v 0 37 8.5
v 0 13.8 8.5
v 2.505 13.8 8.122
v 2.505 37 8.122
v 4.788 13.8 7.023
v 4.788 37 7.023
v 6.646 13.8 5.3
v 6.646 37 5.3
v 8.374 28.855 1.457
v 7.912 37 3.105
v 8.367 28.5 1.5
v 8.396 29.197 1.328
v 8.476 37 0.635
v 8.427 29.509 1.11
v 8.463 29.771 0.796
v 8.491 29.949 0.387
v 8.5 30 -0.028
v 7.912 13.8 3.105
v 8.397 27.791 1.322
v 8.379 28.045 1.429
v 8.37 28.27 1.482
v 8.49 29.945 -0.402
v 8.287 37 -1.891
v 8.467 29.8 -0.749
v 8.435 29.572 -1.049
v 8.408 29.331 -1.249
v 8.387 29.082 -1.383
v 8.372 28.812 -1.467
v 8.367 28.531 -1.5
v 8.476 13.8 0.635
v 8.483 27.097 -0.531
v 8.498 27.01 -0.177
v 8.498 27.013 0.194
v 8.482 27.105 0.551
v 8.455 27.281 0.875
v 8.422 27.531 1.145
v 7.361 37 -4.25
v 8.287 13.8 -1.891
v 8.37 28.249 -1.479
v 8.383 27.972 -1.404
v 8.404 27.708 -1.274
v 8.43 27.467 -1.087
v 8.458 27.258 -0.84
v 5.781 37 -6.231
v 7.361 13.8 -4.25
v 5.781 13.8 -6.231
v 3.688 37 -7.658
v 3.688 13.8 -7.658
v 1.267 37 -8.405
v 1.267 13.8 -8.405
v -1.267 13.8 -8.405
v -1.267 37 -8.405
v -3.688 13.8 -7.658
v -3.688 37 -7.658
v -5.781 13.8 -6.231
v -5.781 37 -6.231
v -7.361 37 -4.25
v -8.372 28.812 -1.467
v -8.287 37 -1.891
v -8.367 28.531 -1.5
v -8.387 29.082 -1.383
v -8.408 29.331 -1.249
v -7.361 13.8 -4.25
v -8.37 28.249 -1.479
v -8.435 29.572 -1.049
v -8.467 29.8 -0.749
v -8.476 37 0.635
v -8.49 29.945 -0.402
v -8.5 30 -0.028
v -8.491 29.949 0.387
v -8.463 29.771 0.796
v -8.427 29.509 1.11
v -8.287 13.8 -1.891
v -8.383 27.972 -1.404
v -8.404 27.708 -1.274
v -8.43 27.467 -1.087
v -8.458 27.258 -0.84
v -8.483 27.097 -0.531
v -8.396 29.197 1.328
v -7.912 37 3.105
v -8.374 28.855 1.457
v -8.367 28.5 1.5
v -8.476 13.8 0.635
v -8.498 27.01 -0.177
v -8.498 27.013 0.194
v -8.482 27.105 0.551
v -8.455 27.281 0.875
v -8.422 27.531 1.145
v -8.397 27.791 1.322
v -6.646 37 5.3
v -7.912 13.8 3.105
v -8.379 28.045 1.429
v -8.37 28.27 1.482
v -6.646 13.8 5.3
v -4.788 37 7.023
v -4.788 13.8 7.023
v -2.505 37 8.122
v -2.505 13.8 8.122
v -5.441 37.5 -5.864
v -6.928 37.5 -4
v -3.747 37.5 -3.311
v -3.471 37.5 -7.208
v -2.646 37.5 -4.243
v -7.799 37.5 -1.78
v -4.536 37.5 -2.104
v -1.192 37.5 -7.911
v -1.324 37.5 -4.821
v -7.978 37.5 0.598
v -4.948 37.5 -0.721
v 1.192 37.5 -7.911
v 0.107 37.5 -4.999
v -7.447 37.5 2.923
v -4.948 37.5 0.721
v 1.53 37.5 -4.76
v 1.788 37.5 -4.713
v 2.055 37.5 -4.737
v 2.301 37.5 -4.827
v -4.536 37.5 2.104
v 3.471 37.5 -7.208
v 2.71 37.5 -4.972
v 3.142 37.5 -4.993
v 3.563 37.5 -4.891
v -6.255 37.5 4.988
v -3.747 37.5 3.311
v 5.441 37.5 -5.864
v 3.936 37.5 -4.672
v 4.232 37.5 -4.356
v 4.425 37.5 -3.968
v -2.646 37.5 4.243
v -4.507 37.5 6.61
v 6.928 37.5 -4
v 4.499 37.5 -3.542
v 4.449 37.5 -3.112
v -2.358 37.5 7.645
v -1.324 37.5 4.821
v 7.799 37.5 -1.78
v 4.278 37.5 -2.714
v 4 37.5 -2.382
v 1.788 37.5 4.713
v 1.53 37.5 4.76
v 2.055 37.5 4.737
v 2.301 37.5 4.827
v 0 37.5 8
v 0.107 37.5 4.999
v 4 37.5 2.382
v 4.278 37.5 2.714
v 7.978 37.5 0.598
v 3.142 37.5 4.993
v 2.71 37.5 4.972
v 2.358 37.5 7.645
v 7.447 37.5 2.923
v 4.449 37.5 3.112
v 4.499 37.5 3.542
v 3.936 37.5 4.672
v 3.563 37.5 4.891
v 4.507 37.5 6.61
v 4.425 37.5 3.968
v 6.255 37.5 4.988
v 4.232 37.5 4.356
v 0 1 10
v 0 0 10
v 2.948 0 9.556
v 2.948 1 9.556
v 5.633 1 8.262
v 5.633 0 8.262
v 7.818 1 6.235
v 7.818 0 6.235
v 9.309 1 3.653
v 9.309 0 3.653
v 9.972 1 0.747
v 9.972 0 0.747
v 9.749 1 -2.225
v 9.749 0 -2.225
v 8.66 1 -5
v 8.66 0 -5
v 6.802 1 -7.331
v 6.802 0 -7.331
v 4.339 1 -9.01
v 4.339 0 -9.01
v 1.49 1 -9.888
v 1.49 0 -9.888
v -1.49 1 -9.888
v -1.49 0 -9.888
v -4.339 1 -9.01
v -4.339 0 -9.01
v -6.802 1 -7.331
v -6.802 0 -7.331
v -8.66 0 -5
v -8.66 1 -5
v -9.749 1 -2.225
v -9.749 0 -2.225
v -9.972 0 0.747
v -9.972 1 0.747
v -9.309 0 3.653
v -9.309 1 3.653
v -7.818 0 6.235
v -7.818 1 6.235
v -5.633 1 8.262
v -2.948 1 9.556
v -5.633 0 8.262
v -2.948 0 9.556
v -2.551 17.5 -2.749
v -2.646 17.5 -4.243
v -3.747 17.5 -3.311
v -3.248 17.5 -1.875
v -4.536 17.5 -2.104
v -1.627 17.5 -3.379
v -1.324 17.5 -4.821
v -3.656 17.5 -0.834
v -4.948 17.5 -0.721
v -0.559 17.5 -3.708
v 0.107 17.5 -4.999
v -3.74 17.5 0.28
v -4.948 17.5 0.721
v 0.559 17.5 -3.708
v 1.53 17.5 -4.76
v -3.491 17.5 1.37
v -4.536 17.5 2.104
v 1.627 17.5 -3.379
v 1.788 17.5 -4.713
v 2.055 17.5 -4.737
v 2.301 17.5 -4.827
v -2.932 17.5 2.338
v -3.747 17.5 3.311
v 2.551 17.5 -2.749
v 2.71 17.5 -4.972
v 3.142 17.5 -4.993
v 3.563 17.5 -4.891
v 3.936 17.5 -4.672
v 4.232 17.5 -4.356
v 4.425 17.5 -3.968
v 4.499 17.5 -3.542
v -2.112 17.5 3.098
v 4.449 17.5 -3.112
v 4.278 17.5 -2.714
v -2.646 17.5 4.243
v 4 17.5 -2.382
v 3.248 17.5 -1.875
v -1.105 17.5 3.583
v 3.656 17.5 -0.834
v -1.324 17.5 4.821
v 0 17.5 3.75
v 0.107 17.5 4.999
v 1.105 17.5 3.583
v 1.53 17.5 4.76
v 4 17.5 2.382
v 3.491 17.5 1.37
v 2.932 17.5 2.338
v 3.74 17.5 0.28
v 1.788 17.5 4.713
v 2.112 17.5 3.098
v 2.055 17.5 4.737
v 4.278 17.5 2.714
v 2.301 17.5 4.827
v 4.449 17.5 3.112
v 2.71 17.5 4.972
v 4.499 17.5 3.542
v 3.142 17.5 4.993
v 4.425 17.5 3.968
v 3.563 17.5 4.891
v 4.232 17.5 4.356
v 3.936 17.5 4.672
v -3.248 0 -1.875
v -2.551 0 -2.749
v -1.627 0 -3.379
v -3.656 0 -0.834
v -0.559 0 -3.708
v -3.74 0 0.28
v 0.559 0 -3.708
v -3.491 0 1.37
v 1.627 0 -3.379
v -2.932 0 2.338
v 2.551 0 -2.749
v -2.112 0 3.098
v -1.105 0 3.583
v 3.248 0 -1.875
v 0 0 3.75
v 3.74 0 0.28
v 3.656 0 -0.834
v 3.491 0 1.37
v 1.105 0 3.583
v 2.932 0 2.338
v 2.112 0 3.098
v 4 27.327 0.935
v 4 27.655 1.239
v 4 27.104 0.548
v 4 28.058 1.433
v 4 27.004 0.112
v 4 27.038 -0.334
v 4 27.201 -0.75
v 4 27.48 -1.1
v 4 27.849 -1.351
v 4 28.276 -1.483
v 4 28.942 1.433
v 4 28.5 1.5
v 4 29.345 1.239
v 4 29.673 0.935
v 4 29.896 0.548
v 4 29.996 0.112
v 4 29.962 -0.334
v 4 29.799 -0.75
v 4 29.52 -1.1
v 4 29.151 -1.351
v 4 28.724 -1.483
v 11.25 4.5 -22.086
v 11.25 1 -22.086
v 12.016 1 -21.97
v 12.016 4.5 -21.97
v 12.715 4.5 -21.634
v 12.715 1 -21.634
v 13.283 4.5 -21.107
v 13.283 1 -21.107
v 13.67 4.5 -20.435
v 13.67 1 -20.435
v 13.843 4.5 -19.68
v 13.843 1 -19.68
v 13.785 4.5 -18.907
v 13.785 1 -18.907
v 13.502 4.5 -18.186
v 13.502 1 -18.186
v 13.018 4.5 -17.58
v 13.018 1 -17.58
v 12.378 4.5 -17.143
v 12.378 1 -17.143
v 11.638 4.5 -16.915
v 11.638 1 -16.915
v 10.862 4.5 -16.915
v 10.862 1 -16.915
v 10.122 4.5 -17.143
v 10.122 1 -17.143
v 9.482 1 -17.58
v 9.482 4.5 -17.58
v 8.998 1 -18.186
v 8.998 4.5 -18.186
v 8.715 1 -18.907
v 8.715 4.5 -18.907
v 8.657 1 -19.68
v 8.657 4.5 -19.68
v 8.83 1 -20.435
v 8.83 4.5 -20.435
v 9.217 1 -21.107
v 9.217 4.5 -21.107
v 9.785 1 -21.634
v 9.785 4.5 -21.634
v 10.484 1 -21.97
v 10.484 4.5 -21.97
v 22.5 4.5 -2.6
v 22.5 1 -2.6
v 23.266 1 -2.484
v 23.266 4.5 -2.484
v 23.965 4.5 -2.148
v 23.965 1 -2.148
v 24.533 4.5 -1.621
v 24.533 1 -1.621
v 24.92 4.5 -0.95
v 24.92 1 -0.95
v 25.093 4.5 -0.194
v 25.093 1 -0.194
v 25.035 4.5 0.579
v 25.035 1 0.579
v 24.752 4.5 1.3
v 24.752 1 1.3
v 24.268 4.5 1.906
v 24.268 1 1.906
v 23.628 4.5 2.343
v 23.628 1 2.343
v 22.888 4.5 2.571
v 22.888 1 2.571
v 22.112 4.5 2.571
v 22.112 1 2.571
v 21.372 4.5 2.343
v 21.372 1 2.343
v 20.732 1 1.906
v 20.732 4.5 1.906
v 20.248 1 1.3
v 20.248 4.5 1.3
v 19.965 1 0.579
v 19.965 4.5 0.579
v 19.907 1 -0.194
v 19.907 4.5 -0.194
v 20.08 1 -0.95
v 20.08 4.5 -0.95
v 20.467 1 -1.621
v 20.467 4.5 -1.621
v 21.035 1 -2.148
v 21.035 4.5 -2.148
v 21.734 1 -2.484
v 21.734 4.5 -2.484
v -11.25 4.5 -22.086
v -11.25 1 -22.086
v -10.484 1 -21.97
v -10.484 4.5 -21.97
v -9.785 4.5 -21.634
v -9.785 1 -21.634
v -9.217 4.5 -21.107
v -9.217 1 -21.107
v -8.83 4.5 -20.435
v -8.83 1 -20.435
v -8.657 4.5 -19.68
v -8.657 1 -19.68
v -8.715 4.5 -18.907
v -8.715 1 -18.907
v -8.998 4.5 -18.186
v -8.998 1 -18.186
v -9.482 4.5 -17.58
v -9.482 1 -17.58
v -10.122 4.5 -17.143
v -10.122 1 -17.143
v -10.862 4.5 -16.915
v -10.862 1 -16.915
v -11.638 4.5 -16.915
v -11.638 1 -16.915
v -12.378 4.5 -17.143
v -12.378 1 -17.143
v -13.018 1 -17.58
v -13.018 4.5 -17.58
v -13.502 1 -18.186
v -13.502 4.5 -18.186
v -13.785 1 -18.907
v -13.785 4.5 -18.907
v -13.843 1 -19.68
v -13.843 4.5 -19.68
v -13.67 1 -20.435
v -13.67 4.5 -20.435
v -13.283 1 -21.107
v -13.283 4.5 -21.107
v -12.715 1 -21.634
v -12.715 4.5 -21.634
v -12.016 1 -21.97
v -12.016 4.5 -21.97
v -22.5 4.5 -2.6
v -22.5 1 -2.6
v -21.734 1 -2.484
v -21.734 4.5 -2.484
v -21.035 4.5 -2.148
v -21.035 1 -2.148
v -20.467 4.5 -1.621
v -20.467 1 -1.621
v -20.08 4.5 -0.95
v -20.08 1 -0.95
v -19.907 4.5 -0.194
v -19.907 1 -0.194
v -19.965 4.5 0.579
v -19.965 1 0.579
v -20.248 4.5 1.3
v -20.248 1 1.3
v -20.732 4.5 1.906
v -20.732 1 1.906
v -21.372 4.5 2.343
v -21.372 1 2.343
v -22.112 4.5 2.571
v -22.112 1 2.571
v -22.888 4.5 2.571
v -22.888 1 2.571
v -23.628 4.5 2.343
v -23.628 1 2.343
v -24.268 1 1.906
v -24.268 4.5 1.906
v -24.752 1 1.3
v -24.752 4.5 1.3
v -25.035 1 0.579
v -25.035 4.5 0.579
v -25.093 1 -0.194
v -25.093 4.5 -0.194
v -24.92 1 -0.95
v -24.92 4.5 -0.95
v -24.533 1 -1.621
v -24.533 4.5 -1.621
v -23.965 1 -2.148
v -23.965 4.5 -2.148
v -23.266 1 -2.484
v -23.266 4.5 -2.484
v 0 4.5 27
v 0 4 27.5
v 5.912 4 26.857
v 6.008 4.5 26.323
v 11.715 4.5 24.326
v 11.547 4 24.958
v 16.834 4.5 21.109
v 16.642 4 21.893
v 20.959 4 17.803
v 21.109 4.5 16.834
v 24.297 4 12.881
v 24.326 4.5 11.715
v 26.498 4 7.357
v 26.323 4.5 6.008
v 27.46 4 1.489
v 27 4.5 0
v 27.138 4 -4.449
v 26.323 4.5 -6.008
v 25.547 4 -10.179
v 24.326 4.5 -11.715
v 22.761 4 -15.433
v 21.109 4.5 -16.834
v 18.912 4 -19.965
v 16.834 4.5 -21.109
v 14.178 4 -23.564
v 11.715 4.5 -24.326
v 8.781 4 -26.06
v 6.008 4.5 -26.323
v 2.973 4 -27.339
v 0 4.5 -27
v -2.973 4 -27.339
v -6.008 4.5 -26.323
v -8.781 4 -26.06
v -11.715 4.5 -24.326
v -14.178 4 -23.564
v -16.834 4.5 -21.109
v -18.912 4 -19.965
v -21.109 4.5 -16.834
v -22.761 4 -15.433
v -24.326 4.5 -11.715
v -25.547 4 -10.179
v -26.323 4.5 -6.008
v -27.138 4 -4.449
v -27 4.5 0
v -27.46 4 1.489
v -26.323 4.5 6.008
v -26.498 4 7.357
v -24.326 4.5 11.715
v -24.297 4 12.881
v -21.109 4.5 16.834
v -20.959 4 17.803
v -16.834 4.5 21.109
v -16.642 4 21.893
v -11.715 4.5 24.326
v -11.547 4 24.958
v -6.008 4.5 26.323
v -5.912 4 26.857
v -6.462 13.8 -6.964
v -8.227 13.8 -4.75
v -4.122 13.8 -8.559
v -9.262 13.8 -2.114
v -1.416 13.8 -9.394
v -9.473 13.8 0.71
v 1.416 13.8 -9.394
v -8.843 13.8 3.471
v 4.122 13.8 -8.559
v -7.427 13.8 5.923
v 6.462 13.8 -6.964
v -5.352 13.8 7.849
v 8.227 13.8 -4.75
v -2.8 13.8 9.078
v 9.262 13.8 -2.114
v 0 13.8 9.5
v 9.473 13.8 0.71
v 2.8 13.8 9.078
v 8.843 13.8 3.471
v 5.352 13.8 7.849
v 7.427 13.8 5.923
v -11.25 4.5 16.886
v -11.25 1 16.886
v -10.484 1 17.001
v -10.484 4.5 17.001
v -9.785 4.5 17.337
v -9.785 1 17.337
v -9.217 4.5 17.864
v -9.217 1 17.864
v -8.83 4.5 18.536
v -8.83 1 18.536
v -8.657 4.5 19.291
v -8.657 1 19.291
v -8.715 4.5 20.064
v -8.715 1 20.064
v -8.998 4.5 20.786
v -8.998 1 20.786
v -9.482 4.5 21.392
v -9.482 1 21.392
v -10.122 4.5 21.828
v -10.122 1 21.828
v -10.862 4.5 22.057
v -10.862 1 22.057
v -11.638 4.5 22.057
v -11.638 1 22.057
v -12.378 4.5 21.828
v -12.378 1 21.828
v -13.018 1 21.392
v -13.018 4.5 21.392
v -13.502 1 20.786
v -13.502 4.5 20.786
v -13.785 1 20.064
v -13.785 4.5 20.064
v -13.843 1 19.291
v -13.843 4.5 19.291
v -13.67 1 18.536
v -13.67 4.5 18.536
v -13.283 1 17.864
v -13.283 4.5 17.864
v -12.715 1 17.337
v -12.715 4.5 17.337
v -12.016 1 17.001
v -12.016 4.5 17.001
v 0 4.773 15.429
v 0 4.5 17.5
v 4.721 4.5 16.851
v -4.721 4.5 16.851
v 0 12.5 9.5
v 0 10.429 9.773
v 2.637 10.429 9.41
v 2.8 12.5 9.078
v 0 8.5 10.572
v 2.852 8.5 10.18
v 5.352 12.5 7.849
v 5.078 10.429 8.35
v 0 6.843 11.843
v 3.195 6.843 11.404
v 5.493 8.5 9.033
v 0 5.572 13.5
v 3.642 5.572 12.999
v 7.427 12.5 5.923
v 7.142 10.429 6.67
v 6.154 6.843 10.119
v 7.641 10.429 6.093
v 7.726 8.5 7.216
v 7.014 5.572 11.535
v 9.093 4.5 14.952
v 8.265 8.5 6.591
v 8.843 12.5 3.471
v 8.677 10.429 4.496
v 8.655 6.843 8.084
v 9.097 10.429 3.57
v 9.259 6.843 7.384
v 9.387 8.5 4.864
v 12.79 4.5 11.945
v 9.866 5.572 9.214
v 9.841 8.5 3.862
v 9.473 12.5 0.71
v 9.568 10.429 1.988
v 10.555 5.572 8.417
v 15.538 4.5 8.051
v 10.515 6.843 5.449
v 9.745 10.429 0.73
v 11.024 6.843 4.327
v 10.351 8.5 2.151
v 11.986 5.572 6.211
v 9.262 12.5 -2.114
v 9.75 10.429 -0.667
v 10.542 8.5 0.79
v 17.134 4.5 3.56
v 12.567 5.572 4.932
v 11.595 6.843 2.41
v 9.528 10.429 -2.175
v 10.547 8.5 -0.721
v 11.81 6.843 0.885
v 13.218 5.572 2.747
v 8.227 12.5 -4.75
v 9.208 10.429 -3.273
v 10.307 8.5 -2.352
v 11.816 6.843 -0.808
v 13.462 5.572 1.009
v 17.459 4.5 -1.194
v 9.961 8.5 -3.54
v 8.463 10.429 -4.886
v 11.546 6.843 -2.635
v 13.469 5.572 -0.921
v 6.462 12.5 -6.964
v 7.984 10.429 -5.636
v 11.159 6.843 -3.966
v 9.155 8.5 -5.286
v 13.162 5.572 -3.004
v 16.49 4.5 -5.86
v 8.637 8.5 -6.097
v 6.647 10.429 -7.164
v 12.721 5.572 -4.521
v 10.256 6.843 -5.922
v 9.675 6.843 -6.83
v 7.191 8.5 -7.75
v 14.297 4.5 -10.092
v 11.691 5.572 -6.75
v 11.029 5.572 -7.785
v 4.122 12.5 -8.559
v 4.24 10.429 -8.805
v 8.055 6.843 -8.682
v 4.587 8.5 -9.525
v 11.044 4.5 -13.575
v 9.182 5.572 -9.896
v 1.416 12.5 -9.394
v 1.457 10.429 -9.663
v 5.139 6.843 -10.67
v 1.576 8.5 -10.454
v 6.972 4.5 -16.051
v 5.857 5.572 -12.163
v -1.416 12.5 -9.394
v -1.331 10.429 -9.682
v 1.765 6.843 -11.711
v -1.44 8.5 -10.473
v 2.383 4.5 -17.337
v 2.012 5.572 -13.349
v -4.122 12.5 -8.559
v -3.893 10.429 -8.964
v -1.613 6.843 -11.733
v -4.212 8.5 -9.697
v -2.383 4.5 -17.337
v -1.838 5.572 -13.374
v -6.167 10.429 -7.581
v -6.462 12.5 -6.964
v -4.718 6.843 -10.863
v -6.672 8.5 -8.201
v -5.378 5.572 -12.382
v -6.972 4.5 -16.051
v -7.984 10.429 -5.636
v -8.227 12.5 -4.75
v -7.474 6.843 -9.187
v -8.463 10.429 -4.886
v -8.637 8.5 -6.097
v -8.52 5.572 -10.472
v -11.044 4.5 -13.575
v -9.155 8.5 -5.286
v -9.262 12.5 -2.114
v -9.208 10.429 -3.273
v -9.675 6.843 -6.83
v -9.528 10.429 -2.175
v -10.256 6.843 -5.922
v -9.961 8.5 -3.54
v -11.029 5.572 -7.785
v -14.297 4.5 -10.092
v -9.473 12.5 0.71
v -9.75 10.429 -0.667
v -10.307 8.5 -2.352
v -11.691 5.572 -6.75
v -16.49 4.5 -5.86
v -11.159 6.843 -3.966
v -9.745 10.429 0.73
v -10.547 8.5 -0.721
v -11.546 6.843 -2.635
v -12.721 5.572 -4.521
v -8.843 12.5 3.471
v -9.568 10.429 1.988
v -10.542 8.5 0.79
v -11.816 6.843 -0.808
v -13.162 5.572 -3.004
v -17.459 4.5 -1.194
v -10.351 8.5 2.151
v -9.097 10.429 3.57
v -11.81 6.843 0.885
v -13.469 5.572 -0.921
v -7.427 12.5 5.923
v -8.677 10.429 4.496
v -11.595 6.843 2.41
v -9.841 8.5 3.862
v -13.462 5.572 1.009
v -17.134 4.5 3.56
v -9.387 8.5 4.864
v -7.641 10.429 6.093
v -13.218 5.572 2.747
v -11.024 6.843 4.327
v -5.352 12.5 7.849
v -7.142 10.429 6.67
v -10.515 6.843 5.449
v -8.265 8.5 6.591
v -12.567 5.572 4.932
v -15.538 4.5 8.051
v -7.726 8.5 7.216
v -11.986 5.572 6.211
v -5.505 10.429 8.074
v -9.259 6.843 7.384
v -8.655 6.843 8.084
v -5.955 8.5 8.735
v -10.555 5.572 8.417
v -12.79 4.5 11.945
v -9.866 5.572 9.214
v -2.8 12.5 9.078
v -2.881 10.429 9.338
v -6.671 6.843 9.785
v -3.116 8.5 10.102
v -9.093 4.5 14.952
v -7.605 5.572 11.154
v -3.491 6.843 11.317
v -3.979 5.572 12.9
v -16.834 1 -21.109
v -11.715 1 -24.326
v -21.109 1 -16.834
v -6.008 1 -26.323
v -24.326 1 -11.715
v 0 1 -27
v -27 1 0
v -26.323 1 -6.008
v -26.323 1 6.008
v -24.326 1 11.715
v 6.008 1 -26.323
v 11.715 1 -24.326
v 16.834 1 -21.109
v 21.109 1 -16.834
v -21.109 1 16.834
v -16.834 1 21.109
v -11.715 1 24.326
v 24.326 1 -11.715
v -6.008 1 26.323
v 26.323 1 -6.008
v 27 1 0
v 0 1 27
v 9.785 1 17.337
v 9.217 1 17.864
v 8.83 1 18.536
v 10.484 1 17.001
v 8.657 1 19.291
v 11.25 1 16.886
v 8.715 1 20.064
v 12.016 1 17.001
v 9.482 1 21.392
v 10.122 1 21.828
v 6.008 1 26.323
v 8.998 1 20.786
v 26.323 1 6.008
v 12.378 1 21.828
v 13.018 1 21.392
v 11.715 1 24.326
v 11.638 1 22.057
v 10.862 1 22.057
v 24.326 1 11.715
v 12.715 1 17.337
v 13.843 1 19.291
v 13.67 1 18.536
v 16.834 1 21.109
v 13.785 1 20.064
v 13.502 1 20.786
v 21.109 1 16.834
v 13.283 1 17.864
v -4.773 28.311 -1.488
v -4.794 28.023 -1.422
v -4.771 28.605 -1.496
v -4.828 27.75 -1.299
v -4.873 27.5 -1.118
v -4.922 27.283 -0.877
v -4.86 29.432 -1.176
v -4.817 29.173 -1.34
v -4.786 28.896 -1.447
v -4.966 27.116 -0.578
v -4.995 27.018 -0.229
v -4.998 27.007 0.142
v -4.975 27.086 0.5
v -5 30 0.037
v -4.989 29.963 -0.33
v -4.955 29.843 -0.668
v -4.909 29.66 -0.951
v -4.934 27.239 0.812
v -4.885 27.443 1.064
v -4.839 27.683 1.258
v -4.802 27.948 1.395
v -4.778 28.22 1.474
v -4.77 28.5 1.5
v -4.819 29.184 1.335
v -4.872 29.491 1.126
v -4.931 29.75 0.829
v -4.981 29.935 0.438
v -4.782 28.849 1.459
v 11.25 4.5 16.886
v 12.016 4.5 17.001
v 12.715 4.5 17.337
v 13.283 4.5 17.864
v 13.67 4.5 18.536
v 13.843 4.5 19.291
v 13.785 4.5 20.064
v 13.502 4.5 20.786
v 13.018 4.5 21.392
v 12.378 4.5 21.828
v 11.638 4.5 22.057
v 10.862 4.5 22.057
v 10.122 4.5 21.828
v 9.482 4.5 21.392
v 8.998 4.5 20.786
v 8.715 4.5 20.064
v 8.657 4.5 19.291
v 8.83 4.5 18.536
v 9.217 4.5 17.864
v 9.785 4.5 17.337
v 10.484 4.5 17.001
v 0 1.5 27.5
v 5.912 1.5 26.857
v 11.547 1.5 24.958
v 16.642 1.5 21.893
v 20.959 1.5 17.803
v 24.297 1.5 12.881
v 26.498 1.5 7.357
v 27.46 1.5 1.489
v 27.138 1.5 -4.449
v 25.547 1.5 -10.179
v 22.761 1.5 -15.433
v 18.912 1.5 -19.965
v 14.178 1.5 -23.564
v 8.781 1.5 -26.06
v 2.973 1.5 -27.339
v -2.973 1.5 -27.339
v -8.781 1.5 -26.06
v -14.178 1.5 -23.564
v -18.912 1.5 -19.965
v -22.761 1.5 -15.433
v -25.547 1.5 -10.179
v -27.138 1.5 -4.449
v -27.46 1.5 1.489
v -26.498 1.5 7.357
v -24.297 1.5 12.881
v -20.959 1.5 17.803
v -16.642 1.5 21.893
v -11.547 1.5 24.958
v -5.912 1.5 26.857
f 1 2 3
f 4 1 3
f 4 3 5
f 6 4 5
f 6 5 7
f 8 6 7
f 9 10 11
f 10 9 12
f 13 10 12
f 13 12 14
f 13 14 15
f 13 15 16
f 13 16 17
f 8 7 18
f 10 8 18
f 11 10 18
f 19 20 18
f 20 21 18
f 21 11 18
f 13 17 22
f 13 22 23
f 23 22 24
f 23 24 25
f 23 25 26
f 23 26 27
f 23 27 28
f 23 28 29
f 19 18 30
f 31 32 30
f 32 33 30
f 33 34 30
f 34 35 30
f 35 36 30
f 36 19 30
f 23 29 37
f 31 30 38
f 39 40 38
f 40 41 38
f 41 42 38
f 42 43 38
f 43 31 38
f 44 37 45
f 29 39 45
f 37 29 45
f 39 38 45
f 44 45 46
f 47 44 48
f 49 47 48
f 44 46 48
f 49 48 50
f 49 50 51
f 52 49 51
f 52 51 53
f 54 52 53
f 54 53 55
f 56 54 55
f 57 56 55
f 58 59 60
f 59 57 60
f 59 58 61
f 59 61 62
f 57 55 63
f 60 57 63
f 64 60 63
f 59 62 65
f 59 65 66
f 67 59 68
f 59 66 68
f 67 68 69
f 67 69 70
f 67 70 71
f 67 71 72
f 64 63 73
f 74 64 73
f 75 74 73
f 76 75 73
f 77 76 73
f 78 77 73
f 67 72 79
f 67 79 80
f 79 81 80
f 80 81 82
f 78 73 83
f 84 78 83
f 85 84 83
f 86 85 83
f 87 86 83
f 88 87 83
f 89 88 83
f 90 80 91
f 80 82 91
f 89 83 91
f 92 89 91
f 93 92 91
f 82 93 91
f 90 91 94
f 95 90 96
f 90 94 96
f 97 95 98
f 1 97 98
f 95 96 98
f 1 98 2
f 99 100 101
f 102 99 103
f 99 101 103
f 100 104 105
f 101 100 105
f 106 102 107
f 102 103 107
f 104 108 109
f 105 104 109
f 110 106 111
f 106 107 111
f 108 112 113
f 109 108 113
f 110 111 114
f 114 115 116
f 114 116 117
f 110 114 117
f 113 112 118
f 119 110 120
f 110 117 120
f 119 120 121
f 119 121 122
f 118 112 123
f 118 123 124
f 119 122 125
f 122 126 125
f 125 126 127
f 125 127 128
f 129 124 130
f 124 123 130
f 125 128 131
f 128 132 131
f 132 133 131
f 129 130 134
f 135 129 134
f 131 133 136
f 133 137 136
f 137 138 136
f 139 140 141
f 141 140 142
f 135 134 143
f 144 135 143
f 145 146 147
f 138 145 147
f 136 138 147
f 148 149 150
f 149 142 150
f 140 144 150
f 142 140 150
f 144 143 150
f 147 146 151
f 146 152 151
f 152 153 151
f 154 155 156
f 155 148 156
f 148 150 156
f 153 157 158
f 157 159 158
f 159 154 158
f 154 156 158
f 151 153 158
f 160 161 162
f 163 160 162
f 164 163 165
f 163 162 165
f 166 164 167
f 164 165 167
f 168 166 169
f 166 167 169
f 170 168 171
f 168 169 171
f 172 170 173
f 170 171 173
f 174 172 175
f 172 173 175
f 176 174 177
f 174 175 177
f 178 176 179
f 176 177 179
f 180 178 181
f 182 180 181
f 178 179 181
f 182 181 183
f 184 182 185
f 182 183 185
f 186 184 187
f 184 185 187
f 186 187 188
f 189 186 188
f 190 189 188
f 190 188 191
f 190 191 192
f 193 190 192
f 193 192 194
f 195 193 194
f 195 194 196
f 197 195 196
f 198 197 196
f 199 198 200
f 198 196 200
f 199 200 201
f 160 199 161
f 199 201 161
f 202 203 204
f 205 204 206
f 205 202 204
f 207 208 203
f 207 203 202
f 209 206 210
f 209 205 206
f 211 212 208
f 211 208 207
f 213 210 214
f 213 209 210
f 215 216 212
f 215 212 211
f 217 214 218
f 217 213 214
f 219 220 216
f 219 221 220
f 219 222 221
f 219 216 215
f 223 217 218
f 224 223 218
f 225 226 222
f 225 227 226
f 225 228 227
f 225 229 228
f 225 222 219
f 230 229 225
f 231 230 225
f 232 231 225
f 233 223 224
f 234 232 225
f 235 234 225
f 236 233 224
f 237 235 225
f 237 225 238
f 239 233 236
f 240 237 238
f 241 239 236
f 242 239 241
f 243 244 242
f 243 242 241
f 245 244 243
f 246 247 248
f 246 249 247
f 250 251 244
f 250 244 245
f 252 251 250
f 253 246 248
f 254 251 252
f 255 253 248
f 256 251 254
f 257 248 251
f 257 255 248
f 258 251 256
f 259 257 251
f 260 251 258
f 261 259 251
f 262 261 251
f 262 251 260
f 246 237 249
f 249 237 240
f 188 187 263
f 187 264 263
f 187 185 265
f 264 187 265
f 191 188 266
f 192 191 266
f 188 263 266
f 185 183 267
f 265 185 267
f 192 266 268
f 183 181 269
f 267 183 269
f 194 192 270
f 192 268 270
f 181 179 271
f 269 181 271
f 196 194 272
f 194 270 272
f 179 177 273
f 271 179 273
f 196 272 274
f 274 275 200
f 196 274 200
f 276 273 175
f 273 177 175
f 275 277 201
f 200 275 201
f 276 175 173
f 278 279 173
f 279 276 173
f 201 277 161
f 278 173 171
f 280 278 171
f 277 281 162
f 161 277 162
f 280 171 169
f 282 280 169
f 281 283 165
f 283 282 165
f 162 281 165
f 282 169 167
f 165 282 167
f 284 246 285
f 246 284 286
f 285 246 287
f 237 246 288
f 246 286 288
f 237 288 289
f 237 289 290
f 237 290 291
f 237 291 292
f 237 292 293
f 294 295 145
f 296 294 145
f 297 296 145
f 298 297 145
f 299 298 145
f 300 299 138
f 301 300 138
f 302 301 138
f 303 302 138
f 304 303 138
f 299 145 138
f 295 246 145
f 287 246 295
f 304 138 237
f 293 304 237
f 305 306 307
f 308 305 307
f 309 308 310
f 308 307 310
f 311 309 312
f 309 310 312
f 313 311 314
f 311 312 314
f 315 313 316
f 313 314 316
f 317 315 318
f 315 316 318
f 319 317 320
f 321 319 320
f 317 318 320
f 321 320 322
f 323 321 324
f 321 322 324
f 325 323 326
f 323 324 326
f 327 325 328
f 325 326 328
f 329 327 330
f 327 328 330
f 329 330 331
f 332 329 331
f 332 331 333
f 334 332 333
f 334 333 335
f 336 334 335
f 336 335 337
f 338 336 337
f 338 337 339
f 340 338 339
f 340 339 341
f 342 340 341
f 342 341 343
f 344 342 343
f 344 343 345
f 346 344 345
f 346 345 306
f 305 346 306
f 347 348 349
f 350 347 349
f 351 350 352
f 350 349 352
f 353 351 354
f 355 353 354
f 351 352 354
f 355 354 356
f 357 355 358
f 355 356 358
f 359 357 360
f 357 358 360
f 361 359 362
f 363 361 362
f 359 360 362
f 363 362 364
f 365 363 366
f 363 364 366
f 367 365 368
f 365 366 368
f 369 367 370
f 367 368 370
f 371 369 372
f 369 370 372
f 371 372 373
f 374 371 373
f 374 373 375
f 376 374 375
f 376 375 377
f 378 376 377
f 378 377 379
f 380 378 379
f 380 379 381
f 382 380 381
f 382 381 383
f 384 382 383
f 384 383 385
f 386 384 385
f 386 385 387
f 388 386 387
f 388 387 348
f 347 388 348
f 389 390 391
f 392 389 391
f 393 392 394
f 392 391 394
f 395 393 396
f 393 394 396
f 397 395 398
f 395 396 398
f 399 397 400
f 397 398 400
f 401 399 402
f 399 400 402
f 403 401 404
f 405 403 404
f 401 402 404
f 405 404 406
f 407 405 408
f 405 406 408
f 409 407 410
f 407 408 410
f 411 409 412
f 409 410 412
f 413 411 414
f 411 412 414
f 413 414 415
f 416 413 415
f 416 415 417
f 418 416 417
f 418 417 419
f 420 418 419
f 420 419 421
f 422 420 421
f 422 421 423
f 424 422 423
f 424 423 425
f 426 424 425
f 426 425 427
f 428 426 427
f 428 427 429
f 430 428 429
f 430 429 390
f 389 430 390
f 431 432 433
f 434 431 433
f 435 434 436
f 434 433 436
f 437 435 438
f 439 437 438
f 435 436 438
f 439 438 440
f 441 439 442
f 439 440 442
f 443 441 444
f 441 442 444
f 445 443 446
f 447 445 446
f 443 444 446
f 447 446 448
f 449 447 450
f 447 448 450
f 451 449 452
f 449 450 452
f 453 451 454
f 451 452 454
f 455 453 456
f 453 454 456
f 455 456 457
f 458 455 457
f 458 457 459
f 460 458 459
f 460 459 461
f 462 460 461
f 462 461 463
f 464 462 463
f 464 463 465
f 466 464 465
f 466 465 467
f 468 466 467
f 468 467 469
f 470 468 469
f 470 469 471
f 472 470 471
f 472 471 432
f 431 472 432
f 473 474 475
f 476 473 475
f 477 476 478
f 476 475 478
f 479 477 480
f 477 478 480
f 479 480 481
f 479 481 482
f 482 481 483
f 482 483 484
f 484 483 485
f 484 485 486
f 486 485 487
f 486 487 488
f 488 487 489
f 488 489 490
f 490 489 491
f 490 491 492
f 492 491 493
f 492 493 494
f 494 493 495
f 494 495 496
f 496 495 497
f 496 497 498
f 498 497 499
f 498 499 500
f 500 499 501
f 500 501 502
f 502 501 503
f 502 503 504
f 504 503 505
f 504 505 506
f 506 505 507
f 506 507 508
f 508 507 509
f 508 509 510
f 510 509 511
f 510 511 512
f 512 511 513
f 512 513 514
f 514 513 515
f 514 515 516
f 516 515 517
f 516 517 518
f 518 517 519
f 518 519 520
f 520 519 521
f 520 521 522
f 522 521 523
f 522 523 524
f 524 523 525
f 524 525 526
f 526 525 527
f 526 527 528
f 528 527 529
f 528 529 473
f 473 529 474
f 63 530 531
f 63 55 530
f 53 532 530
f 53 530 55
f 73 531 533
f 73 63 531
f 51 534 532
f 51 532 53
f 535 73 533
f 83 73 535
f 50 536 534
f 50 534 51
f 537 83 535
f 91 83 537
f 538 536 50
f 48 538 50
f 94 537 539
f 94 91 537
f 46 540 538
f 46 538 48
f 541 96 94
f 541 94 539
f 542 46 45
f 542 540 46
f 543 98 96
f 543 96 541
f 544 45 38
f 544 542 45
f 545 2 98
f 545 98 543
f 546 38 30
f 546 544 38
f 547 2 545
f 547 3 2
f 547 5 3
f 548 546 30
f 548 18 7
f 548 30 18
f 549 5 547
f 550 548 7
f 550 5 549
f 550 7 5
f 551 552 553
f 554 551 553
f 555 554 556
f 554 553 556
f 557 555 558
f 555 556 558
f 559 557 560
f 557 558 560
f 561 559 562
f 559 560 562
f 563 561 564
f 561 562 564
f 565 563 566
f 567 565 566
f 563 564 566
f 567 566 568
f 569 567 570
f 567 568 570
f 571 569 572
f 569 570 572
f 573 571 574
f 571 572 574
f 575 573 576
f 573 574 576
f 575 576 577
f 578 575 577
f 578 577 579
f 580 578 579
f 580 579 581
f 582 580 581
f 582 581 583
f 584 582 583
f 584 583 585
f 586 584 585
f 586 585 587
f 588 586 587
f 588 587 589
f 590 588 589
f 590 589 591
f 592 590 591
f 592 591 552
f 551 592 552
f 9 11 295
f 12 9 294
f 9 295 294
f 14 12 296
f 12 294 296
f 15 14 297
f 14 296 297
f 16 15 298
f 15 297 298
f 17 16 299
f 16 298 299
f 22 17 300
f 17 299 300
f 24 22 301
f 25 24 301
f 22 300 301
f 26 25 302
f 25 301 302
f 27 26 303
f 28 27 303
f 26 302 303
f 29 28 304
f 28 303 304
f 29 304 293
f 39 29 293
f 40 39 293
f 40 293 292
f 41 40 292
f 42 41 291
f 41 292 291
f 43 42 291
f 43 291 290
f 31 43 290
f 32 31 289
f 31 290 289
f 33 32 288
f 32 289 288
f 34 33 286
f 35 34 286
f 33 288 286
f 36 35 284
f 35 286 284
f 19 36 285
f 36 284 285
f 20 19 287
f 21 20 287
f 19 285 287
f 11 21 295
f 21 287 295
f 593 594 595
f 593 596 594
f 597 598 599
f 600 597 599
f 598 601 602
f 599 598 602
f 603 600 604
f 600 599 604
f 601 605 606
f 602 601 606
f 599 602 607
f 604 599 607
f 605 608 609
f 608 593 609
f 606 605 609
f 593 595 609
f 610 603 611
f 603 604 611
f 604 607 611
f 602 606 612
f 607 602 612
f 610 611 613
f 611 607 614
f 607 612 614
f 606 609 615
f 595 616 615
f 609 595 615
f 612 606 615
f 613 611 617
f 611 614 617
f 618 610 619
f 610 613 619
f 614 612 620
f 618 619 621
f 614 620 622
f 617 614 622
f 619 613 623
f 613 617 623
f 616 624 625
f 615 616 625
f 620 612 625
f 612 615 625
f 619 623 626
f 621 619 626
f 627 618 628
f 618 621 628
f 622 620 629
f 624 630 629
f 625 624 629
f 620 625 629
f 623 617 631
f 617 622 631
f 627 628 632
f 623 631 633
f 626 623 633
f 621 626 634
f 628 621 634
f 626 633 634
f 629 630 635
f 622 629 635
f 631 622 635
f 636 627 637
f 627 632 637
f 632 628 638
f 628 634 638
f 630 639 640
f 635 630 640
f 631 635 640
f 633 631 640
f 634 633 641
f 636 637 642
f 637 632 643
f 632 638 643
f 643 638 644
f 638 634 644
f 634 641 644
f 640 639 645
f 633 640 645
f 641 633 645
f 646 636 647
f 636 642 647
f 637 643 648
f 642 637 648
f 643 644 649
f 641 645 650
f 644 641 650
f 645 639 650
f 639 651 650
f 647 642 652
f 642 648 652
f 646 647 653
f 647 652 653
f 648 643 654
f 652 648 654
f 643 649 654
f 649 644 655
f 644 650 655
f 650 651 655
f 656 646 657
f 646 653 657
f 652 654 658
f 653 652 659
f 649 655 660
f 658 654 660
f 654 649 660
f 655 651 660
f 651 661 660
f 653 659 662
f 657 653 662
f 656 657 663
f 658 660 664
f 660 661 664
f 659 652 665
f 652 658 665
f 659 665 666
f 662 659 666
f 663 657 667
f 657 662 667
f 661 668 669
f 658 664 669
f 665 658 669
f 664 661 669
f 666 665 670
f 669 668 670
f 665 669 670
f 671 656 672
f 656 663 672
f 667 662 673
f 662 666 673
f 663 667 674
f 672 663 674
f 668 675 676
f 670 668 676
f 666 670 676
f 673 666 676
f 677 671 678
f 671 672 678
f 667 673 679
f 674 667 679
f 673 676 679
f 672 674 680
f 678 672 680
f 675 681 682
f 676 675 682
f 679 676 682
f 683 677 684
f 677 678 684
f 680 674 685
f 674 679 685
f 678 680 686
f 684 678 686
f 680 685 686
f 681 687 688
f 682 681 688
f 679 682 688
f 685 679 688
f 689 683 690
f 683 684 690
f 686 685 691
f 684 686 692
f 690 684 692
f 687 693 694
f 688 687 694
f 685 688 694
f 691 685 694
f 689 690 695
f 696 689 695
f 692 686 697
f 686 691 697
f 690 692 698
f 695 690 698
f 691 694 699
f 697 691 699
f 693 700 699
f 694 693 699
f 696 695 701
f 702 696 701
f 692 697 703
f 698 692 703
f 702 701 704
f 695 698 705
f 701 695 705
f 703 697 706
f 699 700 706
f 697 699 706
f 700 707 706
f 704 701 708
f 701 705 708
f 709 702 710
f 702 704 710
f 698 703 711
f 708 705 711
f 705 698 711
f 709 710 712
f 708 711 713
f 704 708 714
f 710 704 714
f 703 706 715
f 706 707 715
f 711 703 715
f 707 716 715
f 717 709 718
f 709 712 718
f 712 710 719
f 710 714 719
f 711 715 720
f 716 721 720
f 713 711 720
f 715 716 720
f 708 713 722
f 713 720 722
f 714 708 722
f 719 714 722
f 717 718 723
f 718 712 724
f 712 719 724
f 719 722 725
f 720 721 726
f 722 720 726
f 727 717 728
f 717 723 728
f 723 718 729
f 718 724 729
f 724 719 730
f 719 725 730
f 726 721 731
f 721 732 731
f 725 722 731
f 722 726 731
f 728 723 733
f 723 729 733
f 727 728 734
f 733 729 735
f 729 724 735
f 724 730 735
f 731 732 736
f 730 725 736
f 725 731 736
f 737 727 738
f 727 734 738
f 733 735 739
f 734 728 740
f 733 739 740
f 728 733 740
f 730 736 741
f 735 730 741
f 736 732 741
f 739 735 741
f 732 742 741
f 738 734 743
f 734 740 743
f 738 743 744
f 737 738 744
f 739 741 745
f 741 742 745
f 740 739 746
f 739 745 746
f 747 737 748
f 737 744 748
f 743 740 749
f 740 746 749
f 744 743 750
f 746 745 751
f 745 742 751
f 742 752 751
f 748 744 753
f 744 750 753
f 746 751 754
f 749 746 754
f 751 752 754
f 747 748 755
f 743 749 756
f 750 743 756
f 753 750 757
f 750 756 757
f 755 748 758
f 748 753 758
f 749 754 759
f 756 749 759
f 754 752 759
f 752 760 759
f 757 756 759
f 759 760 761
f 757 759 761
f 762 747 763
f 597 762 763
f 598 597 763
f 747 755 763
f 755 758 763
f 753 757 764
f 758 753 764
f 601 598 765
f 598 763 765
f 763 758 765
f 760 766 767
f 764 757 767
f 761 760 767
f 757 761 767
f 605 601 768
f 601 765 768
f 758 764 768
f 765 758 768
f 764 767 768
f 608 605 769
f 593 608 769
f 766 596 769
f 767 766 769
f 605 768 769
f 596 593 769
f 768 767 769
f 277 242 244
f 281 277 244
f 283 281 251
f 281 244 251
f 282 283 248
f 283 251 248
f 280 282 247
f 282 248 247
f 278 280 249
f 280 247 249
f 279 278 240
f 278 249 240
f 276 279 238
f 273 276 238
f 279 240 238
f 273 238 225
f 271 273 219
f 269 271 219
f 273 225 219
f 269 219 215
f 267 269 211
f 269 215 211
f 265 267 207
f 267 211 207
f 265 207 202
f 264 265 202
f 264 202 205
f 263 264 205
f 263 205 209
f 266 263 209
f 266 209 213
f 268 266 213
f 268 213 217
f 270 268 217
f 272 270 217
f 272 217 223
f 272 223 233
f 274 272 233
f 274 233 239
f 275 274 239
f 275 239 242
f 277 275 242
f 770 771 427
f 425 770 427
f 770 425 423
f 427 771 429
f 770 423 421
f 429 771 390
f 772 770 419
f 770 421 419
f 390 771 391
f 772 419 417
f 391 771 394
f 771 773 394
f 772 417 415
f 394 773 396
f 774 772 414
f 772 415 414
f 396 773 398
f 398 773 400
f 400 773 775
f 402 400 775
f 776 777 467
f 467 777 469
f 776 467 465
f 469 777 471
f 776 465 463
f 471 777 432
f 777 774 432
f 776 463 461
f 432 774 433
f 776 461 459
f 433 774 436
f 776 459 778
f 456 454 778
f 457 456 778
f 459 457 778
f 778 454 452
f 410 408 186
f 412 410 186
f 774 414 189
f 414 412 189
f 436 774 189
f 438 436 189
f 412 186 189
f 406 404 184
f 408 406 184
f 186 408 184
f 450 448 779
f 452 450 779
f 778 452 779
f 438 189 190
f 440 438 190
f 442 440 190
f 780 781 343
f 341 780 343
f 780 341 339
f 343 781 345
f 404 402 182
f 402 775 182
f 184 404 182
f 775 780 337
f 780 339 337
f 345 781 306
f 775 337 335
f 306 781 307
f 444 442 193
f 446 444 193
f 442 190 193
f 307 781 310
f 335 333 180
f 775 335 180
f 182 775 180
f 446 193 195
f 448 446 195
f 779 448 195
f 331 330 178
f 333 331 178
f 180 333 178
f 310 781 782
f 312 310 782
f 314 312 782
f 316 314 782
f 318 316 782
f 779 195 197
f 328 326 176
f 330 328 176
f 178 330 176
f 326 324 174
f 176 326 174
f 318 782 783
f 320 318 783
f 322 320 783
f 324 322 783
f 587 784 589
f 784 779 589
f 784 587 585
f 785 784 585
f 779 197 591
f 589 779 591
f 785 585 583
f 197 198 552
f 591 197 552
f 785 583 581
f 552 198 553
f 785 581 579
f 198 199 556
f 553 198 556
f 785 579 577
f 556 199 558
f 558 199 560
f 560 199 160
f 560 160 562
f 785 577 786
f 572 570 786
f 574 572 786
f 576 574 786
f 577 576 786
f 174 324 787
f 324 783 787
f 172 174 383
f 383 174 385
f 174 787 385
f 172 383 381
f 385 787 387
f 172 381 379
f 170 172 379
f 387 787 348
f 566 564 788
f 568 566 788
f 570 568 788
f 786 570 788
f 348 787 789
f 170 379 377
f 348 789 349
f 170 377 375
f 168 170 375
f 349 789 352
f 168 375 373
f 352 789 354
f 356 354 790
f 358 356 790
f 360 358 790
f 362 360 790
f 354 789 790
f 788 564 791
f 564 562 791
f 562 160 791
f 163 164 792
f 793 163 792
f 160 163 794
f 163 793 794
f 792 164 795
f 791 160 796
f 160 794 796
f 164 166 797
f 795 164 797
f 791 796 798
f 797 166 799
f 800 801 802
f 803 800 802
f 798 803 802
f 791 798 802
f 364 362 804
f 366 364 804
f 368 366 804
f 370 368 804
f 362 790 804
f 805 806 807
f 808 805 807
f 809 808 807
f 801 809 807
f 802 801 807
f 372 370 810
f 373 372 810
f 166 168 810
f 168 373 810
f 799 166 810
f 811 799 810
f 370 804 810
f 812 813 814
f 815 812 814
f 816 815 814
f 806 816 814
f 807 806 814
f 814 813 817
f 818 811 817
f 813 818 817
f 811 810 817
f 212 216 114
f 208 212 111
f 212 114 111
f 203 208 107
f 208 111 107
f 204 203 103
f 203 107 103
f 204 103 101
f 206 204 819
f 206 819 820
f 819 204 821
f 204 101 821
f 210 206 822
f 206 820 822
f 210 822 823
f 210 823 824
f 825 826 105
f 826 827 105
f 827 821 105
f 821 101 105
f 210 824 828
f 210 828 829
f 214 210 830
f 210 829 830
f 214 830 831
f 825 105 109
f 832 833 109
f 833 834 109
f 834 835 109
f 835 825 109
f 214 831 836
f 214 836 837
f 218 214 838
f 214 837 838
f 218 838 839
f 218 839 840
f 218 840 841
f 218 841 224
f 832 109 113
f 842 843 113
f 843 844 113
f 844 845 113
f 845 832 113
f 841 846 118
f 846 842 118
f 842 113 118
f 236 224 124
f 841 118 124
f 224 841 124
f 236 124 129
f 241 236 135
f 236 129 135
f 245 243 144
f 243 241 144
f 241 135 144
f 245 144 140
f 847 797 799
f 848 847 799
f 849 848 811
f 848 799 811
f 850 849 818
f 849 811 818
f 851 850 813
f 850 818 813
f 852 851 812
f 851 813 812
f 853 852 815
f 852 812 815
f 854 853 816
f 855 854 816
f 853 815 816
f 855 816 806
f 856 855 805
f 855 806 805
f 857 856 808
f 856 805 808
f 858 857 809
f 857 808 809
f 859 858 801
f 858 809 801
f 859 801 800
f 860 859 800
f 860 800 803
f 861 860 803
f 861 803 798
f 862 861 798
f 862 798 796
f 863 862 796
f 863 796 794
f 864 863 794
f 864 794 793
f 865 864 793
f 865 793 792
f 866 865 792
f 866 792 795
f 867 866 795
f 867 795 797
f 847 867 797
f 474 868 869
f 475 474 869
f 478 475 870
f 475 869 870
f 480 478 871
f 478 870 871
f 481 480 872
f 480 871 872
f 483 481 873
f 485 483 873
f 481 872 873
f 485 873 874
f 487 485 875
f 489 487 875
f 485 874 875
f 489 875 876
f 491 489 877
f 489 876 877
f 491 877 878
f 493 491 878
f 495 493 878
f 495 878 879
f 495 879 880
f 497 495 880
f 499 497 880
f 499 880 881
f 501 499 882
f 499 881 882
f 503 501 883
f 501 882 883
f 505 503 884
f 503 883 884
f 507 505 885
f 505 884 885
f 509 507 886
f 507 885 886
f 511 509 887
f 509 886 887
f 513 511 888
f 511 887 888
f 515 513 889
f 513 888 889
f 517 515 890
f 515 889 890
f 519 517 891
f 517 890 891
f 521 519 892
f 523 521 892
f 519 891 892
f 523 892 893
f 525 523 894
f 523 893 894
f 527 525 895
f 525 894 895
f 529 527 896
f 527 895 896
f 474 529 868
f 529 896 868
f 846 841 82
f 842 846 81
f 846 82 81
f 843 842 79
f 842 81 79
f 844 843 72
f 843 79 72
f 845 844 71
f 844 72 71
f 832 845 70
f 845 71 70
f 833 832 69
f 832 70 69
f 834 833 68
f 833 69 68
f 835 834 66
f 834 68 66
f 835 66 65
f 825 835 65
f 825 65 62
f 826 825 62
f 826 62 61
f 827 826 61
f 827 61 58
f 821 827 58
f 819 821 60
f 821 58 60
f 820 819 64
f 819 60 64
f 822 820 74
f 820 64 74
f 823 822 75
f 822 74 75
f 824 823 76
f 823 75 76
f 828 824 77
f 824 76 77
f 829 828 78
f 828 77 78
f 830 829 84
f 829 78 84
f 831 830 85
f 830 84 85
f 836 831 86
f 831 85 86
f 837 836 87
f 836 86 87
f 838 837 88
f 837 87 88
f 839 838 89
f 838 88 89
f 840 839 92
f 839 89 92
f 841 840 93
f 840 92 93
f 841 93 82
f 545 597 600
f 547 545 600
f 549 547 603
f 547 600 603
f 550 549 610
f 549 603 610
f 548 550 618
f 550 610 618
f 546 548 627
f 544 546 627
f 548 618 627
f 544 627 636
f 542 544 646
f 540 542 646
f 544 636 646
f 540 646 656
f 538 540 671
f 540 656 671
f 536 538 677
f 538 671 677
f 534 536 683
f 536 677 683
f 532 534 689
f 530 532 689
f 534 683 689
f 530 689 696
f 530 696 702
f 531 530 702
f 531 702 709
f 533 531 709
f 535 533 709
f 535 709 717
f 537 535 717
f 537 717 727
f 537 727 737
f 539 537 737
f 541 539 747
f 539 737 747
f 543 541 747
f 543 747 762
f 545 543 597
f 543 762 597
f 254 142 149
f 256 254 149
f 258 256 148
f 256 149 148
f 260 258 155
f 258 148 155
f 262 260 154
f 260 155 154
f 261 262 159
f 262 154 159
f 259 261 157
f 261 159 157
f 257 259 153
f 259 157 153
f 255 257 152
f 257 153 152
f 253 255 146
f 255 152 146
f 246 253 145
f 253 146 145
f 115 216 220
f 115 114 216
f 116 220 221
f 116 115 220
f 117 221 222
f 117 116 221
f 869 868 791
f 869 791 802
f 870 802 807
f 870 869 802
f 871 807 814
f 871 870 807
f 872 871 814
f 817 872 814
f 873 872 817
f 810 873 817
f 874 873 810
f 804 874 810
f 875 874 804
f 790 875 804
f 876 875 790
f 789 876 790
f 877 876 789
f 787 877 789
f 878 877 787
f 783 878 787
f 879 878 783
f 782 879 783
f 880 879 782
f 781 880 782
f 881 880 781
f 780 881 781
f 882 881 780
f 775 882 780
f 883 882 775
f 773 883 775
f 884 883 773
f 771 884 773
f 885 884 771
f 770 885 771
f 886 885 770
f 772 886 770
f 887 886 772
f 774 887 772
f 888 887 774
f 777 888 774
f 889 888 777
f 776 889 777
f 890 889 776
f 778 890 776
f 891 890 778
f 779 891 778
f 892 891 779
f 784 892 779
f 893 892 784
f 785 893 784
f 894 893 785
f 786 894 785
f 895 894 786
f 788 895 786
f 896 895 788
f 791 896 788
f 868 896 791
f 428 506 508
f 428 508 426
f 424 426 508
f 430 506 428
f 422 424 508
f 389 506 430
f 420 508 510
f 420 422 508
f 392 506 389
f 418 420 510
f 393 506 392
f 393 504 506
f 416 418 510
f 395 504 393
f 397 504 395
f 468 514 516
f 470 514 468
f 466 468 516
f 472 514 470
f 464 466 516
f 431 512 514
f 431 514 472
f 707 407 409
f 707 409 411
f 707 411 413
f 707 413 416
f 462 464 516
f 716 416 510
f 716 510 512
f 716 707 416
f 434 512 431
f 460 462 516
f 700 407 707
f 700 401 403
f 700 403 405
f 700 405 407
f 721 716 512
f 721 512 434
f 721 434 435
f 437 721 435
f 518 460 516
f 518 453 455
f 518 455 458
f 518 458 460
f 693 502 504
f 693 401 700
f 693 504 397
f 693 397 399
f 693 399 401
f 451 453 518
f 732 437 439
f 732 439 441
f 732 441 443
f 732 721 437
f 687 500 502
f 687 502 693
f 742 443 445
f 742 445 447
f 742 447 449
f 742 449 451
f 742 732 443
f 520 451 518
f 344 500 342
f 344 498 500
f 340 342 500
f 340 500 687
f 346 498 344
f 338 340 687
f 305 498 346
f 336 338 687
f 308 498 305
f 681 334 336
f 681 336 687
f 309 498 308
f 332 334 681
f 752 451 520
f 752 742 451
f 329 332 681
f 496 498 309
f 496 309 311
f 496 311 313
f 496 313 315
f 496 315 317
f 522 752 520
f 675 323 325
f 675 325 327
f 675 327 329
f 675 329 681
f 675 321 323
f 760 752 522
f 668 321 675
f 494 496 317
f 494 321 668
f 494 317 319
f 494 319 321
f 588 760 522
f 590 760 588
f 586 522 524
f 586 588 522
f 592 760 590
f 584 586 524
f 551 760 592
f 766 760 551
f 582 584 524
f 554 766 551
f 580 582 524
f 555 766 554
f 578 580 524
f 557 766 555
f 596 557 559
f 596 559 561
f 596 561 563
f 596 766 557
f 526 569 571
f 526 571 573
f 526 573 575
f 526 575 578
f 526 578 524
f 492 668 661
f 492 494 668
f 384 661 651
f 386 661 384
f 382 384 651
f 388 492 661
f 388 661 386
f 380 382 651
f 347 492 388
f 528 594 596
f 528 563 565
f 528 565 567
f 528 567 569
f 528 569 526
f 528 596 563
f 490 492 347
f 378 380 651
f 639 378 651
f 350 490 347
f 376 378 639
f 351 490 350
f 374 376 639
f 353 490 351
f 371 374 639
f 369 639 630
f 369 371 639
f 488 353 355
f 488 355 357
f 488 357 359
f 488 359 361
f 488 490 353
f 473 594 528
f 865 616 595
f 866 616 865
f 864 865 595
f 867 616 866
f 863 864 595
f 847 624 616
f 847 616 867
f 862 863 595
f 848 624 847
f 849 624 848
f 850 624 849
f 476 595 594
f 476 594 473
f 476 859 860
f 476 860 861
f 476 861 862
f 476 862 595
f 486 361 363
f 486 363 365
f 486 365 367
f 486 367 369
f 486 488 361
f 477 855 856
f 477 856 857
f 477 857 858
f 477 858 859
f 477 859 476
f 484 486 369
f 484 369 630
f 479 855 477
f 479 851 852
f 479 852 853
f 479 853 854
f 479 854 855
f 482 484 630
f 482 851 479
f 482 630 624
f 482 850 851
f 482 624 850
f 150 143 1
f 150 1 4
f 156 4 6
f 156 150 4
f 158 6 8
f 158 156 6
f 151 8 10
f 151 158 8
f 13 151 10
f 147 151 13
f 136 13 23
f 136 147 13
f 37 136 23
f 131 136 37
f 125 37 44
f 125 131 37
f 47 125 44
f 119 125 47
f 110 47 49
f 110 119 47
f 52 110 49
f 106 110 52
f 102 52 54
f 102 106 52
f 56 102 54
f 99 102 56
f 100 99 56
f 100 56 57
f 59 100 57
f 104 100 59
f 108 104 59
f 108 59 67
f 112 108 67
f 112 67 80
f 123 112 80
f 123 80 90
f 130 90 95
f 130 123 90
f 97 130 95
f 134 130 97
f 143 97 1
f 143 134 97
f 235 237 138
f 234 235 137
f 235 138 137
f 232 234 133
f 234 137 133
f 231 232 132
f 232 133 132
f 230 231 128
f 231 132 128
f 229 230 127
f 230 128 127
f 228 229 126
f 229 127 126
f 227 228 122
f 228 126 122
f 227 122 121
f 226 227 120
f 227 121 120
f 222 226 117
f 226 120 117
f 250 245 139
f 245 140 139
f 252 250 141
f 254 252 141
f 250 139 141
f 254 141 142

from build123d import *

# Parameters (mm, degrees)
SKETCH_1_R          = 10
EXTRUDE_1_DEPTH     = 1
SKETCH_2_R          = 27.5
EXTRUDE_2_DEPTH     = 3.5
SKETCH_3_R          = 8.5
EXTRUDE_3_DEPTH     = 33
SKETCH_4_R          = 5
CUT_EXTRUDE_1_DEPTH = 20
EXTRUDE_START       = -37.5
EXTRUDE_4_DEPTH     = 37.5
SKETCH_9_R          = 1.5
CUT_EXTRUDE_4_DEPTH = 15
SKETCH_10_R         = 9.5
SKETCH_10_R_2       = 8.5
EXTRUDE_5_DEPTH     = 9.3
FILLET_2_R          = 8
CHAMFER_1_SIZE      = 0.5
CHAMFER_2_SIZE      = 0.5
SKETCH_12_R         = 1.5
CUT_EXTRUDE_6_DEPTH = 20
SKETCH_13_R         = 3.75
CUT_EXTRUDE_7_DEPTH = 44.732139257
FILLET_3_R          = 1
CHAMFER_3_SIZE      = 0.5
SKETCH_14_R         = 2.6
CUT_EXTRUDE_8_DEPTH = 10


with BuildPart() as part:
    # 草图1 → 凸台-拉伸1 (new body)
    with BuildSketch(Plane(origin=(0, 0, 0), x_dir=(1, 0, 0), z_dir=(0, 1, 0))):
        with Locations(Location((0, 0, 0), (0, 0, 270))):
            Circle(SKETCH_1_R)
    extrude(amount=EXTRUDE_1_DEPTH)

    # 草图2 → 凸台-拉伸2 (add)
    with BuildSketch(Plane(origin=(0, 1, 0), x_dir=(1, 0, 0), z_dir=(0, 1, 0))):
        with Locations(Location((0, 0, 0), (0, 0, 270))):
            Circle(SKETCH_2_R)
    extrude(amount=EXTRUDE_2_DEPTH)

    # 草图3 → 凸台-拉伸3 (add)
    with BuildSketch(Plane(origin=(0, 4.5, 0), x_dir=(1, 0, 0), z_dir=(0, 1, 0))):
        with Locations(Location((0, 0, 0), (0, 0, 270))):
            Circle(SKETCH_3_R)
    extrude(amount=EXTRUDE_3_DEPTH)

    # 草图4 → 切除-拉伸1 (cut)
    with BuildSketch(Plane(origin=(0, 37.5, 0), x_dir=(1, 0, 0), z_dir=(0, 1, 0))):
        with Locations(Location((0, 0, 0), (0, 0, 270))):
            Circle(SKETCH_4_R)
    extrude(amount=-CUT_EXTRUDE_1_DEPTH, mode=Mode.SUBTRACT)

    # 草图8 → 凸台-拉伸4 (add)
    with BuildSketch(Plane.XZ.offset(EXTRUDE_START)):
        with BuildLine():
            Line((4, 3), (4, -3))
            ThreePointArc((4, -3), (5, 0), (4, 3))
        make_face()
    extrude(amount=EXTRUDE_4_DEPTH)

    # 草图9 → 切除-拉伸4 (cut, symmetric)
    with BuildSketch(Plane.ZY.offset(-4)):
        with Locations((0, 28.5)):
            Circle(SKETCH_9_R)
    extrude(amount=CUT_EXTRUDE_4_DEPTH, both=True, mode=Mode.SUBTRACT)

    # 草图10 → 凸台-拉伸5 (add)
    with BuildSketch(Plane(origin=(0, 4.5, 0), x_dir=(1, 0, 0), z_dir=(0, 1, 0))):
        with Locations(Location((0, 0, 0), (0, 0, 270))):
            Circle(SKETCH_10_R)
        with Locations(Location((0, 0, 0), (0, 0, 270))):
            Circle(SKETCH_10_R_2, mode=Mode.SUBTRACT)
    extrude(amount=EXTRUDE_5_DEPTH)

    # 圆角2
    fillet_2_edges = [part.edges().sort_by_distance(p)[0] for p in [
        (0, 4.5, -9.5),
    ]]
    fillet(fillet_2_edges, radius=FILLET_2_R)

    # 倒角1
    chamfer_1_edges = [part.edges().sort_by_distance(p)[0] for p in [
        (0, 4.5, -27.5),
    ]]
    chamfer(chamfer_1_edges, length=CHAMFER_1_SIZE)

    # 倒角2
    chamfer_2_edges = [part.edges().sort_by_distance(p)[0] for p in [
        (0, 37.5, -8.5),
    ]]
    chamfer(chamfer_2_edges, length=CHAMFER_2_SIZE)

    # 草图12 → 切除-拉伸6 (cut)
    with BuildSketch(Plane(origin=(0, 37.5, 0), x_dir=(1, 0, 0), z_dir=(0, 1, 0))):
        with Locations((3, 3.5)):
            Circle(SKETCH_12_R)
        with Locations((3, -3.5)):
            Circle(SKETCH_12_R)
    extrude(amount=-CUT_EXTRUDE_6_DEPTH, mode=Mode.SUBTRACT)

    # 草图13 → 切除-拉伸7 (cut, through all)
    with BuildSketch(Plane(origin=(0, 17.5, 0), x_dir=(1, 0, 0), z_dir=(0, 1, 0))):
        with Locations(Location((0, 0, 0), (0, 0, 270))):
            Circle(SKETCH_13_R)
    extrude(amount=-CUT_EXTRUDE_7_DEPTH, mode=Mode.SUBTRACT)

    # 圆角3
    fillet_3_edges = [part.edges().sort_by_distance(p)[0] for p in [
        (1.973716593, 27.5, -4.593957206),
        (1.973716593, 27.5, 4.593957206),
    ]]
    fillet(fillet_3_edges, radius=FILLET_3_R)

    # 倒角3
    chamfer_3_edges = [part.edges().sort_by_distance(p)[0] for p in [
        (0, 1, -27.5),
    ]]
    chamfer(chamfer_3_edges, length=CHAMFER_3_SIZE)

    # 草图14 → 切除-拉伸8 (cut)
    with BuildSketch(Plane.XZ.offset(-1)):
        with Locations(Location((22.5, 0, 0), (0, 0, 270))):
            Circle(SKETCH_14_R)
        with Locations(Location((11.25, -19.485571585, 0), (0, 0, 270))):
            Circle(SKETCH_14_R)
        with Locations(Location((-11.25, -19.485571585, 0), (0, 0, 270))):
            Circle(SKETCH_14_R)
        with Locations(Location((-22.5, 0, 0), (0, 0, 270))):
            Circle(SKETCH_14_R)
        with Locations(Location((-11.25, 19.485571585, 0), (0, 0, 270))):
            Circle(SKETCH_14_R)
        with Locations(Location((11.25, 19.485571585, 0), (0, 0, 270))):
            Circle(SKETCH_14_R)
    extrude(amount=-CUT_EXTRUDE_8_DEPTH, mode=Mode.SUBTRACT)


solid = part.part
